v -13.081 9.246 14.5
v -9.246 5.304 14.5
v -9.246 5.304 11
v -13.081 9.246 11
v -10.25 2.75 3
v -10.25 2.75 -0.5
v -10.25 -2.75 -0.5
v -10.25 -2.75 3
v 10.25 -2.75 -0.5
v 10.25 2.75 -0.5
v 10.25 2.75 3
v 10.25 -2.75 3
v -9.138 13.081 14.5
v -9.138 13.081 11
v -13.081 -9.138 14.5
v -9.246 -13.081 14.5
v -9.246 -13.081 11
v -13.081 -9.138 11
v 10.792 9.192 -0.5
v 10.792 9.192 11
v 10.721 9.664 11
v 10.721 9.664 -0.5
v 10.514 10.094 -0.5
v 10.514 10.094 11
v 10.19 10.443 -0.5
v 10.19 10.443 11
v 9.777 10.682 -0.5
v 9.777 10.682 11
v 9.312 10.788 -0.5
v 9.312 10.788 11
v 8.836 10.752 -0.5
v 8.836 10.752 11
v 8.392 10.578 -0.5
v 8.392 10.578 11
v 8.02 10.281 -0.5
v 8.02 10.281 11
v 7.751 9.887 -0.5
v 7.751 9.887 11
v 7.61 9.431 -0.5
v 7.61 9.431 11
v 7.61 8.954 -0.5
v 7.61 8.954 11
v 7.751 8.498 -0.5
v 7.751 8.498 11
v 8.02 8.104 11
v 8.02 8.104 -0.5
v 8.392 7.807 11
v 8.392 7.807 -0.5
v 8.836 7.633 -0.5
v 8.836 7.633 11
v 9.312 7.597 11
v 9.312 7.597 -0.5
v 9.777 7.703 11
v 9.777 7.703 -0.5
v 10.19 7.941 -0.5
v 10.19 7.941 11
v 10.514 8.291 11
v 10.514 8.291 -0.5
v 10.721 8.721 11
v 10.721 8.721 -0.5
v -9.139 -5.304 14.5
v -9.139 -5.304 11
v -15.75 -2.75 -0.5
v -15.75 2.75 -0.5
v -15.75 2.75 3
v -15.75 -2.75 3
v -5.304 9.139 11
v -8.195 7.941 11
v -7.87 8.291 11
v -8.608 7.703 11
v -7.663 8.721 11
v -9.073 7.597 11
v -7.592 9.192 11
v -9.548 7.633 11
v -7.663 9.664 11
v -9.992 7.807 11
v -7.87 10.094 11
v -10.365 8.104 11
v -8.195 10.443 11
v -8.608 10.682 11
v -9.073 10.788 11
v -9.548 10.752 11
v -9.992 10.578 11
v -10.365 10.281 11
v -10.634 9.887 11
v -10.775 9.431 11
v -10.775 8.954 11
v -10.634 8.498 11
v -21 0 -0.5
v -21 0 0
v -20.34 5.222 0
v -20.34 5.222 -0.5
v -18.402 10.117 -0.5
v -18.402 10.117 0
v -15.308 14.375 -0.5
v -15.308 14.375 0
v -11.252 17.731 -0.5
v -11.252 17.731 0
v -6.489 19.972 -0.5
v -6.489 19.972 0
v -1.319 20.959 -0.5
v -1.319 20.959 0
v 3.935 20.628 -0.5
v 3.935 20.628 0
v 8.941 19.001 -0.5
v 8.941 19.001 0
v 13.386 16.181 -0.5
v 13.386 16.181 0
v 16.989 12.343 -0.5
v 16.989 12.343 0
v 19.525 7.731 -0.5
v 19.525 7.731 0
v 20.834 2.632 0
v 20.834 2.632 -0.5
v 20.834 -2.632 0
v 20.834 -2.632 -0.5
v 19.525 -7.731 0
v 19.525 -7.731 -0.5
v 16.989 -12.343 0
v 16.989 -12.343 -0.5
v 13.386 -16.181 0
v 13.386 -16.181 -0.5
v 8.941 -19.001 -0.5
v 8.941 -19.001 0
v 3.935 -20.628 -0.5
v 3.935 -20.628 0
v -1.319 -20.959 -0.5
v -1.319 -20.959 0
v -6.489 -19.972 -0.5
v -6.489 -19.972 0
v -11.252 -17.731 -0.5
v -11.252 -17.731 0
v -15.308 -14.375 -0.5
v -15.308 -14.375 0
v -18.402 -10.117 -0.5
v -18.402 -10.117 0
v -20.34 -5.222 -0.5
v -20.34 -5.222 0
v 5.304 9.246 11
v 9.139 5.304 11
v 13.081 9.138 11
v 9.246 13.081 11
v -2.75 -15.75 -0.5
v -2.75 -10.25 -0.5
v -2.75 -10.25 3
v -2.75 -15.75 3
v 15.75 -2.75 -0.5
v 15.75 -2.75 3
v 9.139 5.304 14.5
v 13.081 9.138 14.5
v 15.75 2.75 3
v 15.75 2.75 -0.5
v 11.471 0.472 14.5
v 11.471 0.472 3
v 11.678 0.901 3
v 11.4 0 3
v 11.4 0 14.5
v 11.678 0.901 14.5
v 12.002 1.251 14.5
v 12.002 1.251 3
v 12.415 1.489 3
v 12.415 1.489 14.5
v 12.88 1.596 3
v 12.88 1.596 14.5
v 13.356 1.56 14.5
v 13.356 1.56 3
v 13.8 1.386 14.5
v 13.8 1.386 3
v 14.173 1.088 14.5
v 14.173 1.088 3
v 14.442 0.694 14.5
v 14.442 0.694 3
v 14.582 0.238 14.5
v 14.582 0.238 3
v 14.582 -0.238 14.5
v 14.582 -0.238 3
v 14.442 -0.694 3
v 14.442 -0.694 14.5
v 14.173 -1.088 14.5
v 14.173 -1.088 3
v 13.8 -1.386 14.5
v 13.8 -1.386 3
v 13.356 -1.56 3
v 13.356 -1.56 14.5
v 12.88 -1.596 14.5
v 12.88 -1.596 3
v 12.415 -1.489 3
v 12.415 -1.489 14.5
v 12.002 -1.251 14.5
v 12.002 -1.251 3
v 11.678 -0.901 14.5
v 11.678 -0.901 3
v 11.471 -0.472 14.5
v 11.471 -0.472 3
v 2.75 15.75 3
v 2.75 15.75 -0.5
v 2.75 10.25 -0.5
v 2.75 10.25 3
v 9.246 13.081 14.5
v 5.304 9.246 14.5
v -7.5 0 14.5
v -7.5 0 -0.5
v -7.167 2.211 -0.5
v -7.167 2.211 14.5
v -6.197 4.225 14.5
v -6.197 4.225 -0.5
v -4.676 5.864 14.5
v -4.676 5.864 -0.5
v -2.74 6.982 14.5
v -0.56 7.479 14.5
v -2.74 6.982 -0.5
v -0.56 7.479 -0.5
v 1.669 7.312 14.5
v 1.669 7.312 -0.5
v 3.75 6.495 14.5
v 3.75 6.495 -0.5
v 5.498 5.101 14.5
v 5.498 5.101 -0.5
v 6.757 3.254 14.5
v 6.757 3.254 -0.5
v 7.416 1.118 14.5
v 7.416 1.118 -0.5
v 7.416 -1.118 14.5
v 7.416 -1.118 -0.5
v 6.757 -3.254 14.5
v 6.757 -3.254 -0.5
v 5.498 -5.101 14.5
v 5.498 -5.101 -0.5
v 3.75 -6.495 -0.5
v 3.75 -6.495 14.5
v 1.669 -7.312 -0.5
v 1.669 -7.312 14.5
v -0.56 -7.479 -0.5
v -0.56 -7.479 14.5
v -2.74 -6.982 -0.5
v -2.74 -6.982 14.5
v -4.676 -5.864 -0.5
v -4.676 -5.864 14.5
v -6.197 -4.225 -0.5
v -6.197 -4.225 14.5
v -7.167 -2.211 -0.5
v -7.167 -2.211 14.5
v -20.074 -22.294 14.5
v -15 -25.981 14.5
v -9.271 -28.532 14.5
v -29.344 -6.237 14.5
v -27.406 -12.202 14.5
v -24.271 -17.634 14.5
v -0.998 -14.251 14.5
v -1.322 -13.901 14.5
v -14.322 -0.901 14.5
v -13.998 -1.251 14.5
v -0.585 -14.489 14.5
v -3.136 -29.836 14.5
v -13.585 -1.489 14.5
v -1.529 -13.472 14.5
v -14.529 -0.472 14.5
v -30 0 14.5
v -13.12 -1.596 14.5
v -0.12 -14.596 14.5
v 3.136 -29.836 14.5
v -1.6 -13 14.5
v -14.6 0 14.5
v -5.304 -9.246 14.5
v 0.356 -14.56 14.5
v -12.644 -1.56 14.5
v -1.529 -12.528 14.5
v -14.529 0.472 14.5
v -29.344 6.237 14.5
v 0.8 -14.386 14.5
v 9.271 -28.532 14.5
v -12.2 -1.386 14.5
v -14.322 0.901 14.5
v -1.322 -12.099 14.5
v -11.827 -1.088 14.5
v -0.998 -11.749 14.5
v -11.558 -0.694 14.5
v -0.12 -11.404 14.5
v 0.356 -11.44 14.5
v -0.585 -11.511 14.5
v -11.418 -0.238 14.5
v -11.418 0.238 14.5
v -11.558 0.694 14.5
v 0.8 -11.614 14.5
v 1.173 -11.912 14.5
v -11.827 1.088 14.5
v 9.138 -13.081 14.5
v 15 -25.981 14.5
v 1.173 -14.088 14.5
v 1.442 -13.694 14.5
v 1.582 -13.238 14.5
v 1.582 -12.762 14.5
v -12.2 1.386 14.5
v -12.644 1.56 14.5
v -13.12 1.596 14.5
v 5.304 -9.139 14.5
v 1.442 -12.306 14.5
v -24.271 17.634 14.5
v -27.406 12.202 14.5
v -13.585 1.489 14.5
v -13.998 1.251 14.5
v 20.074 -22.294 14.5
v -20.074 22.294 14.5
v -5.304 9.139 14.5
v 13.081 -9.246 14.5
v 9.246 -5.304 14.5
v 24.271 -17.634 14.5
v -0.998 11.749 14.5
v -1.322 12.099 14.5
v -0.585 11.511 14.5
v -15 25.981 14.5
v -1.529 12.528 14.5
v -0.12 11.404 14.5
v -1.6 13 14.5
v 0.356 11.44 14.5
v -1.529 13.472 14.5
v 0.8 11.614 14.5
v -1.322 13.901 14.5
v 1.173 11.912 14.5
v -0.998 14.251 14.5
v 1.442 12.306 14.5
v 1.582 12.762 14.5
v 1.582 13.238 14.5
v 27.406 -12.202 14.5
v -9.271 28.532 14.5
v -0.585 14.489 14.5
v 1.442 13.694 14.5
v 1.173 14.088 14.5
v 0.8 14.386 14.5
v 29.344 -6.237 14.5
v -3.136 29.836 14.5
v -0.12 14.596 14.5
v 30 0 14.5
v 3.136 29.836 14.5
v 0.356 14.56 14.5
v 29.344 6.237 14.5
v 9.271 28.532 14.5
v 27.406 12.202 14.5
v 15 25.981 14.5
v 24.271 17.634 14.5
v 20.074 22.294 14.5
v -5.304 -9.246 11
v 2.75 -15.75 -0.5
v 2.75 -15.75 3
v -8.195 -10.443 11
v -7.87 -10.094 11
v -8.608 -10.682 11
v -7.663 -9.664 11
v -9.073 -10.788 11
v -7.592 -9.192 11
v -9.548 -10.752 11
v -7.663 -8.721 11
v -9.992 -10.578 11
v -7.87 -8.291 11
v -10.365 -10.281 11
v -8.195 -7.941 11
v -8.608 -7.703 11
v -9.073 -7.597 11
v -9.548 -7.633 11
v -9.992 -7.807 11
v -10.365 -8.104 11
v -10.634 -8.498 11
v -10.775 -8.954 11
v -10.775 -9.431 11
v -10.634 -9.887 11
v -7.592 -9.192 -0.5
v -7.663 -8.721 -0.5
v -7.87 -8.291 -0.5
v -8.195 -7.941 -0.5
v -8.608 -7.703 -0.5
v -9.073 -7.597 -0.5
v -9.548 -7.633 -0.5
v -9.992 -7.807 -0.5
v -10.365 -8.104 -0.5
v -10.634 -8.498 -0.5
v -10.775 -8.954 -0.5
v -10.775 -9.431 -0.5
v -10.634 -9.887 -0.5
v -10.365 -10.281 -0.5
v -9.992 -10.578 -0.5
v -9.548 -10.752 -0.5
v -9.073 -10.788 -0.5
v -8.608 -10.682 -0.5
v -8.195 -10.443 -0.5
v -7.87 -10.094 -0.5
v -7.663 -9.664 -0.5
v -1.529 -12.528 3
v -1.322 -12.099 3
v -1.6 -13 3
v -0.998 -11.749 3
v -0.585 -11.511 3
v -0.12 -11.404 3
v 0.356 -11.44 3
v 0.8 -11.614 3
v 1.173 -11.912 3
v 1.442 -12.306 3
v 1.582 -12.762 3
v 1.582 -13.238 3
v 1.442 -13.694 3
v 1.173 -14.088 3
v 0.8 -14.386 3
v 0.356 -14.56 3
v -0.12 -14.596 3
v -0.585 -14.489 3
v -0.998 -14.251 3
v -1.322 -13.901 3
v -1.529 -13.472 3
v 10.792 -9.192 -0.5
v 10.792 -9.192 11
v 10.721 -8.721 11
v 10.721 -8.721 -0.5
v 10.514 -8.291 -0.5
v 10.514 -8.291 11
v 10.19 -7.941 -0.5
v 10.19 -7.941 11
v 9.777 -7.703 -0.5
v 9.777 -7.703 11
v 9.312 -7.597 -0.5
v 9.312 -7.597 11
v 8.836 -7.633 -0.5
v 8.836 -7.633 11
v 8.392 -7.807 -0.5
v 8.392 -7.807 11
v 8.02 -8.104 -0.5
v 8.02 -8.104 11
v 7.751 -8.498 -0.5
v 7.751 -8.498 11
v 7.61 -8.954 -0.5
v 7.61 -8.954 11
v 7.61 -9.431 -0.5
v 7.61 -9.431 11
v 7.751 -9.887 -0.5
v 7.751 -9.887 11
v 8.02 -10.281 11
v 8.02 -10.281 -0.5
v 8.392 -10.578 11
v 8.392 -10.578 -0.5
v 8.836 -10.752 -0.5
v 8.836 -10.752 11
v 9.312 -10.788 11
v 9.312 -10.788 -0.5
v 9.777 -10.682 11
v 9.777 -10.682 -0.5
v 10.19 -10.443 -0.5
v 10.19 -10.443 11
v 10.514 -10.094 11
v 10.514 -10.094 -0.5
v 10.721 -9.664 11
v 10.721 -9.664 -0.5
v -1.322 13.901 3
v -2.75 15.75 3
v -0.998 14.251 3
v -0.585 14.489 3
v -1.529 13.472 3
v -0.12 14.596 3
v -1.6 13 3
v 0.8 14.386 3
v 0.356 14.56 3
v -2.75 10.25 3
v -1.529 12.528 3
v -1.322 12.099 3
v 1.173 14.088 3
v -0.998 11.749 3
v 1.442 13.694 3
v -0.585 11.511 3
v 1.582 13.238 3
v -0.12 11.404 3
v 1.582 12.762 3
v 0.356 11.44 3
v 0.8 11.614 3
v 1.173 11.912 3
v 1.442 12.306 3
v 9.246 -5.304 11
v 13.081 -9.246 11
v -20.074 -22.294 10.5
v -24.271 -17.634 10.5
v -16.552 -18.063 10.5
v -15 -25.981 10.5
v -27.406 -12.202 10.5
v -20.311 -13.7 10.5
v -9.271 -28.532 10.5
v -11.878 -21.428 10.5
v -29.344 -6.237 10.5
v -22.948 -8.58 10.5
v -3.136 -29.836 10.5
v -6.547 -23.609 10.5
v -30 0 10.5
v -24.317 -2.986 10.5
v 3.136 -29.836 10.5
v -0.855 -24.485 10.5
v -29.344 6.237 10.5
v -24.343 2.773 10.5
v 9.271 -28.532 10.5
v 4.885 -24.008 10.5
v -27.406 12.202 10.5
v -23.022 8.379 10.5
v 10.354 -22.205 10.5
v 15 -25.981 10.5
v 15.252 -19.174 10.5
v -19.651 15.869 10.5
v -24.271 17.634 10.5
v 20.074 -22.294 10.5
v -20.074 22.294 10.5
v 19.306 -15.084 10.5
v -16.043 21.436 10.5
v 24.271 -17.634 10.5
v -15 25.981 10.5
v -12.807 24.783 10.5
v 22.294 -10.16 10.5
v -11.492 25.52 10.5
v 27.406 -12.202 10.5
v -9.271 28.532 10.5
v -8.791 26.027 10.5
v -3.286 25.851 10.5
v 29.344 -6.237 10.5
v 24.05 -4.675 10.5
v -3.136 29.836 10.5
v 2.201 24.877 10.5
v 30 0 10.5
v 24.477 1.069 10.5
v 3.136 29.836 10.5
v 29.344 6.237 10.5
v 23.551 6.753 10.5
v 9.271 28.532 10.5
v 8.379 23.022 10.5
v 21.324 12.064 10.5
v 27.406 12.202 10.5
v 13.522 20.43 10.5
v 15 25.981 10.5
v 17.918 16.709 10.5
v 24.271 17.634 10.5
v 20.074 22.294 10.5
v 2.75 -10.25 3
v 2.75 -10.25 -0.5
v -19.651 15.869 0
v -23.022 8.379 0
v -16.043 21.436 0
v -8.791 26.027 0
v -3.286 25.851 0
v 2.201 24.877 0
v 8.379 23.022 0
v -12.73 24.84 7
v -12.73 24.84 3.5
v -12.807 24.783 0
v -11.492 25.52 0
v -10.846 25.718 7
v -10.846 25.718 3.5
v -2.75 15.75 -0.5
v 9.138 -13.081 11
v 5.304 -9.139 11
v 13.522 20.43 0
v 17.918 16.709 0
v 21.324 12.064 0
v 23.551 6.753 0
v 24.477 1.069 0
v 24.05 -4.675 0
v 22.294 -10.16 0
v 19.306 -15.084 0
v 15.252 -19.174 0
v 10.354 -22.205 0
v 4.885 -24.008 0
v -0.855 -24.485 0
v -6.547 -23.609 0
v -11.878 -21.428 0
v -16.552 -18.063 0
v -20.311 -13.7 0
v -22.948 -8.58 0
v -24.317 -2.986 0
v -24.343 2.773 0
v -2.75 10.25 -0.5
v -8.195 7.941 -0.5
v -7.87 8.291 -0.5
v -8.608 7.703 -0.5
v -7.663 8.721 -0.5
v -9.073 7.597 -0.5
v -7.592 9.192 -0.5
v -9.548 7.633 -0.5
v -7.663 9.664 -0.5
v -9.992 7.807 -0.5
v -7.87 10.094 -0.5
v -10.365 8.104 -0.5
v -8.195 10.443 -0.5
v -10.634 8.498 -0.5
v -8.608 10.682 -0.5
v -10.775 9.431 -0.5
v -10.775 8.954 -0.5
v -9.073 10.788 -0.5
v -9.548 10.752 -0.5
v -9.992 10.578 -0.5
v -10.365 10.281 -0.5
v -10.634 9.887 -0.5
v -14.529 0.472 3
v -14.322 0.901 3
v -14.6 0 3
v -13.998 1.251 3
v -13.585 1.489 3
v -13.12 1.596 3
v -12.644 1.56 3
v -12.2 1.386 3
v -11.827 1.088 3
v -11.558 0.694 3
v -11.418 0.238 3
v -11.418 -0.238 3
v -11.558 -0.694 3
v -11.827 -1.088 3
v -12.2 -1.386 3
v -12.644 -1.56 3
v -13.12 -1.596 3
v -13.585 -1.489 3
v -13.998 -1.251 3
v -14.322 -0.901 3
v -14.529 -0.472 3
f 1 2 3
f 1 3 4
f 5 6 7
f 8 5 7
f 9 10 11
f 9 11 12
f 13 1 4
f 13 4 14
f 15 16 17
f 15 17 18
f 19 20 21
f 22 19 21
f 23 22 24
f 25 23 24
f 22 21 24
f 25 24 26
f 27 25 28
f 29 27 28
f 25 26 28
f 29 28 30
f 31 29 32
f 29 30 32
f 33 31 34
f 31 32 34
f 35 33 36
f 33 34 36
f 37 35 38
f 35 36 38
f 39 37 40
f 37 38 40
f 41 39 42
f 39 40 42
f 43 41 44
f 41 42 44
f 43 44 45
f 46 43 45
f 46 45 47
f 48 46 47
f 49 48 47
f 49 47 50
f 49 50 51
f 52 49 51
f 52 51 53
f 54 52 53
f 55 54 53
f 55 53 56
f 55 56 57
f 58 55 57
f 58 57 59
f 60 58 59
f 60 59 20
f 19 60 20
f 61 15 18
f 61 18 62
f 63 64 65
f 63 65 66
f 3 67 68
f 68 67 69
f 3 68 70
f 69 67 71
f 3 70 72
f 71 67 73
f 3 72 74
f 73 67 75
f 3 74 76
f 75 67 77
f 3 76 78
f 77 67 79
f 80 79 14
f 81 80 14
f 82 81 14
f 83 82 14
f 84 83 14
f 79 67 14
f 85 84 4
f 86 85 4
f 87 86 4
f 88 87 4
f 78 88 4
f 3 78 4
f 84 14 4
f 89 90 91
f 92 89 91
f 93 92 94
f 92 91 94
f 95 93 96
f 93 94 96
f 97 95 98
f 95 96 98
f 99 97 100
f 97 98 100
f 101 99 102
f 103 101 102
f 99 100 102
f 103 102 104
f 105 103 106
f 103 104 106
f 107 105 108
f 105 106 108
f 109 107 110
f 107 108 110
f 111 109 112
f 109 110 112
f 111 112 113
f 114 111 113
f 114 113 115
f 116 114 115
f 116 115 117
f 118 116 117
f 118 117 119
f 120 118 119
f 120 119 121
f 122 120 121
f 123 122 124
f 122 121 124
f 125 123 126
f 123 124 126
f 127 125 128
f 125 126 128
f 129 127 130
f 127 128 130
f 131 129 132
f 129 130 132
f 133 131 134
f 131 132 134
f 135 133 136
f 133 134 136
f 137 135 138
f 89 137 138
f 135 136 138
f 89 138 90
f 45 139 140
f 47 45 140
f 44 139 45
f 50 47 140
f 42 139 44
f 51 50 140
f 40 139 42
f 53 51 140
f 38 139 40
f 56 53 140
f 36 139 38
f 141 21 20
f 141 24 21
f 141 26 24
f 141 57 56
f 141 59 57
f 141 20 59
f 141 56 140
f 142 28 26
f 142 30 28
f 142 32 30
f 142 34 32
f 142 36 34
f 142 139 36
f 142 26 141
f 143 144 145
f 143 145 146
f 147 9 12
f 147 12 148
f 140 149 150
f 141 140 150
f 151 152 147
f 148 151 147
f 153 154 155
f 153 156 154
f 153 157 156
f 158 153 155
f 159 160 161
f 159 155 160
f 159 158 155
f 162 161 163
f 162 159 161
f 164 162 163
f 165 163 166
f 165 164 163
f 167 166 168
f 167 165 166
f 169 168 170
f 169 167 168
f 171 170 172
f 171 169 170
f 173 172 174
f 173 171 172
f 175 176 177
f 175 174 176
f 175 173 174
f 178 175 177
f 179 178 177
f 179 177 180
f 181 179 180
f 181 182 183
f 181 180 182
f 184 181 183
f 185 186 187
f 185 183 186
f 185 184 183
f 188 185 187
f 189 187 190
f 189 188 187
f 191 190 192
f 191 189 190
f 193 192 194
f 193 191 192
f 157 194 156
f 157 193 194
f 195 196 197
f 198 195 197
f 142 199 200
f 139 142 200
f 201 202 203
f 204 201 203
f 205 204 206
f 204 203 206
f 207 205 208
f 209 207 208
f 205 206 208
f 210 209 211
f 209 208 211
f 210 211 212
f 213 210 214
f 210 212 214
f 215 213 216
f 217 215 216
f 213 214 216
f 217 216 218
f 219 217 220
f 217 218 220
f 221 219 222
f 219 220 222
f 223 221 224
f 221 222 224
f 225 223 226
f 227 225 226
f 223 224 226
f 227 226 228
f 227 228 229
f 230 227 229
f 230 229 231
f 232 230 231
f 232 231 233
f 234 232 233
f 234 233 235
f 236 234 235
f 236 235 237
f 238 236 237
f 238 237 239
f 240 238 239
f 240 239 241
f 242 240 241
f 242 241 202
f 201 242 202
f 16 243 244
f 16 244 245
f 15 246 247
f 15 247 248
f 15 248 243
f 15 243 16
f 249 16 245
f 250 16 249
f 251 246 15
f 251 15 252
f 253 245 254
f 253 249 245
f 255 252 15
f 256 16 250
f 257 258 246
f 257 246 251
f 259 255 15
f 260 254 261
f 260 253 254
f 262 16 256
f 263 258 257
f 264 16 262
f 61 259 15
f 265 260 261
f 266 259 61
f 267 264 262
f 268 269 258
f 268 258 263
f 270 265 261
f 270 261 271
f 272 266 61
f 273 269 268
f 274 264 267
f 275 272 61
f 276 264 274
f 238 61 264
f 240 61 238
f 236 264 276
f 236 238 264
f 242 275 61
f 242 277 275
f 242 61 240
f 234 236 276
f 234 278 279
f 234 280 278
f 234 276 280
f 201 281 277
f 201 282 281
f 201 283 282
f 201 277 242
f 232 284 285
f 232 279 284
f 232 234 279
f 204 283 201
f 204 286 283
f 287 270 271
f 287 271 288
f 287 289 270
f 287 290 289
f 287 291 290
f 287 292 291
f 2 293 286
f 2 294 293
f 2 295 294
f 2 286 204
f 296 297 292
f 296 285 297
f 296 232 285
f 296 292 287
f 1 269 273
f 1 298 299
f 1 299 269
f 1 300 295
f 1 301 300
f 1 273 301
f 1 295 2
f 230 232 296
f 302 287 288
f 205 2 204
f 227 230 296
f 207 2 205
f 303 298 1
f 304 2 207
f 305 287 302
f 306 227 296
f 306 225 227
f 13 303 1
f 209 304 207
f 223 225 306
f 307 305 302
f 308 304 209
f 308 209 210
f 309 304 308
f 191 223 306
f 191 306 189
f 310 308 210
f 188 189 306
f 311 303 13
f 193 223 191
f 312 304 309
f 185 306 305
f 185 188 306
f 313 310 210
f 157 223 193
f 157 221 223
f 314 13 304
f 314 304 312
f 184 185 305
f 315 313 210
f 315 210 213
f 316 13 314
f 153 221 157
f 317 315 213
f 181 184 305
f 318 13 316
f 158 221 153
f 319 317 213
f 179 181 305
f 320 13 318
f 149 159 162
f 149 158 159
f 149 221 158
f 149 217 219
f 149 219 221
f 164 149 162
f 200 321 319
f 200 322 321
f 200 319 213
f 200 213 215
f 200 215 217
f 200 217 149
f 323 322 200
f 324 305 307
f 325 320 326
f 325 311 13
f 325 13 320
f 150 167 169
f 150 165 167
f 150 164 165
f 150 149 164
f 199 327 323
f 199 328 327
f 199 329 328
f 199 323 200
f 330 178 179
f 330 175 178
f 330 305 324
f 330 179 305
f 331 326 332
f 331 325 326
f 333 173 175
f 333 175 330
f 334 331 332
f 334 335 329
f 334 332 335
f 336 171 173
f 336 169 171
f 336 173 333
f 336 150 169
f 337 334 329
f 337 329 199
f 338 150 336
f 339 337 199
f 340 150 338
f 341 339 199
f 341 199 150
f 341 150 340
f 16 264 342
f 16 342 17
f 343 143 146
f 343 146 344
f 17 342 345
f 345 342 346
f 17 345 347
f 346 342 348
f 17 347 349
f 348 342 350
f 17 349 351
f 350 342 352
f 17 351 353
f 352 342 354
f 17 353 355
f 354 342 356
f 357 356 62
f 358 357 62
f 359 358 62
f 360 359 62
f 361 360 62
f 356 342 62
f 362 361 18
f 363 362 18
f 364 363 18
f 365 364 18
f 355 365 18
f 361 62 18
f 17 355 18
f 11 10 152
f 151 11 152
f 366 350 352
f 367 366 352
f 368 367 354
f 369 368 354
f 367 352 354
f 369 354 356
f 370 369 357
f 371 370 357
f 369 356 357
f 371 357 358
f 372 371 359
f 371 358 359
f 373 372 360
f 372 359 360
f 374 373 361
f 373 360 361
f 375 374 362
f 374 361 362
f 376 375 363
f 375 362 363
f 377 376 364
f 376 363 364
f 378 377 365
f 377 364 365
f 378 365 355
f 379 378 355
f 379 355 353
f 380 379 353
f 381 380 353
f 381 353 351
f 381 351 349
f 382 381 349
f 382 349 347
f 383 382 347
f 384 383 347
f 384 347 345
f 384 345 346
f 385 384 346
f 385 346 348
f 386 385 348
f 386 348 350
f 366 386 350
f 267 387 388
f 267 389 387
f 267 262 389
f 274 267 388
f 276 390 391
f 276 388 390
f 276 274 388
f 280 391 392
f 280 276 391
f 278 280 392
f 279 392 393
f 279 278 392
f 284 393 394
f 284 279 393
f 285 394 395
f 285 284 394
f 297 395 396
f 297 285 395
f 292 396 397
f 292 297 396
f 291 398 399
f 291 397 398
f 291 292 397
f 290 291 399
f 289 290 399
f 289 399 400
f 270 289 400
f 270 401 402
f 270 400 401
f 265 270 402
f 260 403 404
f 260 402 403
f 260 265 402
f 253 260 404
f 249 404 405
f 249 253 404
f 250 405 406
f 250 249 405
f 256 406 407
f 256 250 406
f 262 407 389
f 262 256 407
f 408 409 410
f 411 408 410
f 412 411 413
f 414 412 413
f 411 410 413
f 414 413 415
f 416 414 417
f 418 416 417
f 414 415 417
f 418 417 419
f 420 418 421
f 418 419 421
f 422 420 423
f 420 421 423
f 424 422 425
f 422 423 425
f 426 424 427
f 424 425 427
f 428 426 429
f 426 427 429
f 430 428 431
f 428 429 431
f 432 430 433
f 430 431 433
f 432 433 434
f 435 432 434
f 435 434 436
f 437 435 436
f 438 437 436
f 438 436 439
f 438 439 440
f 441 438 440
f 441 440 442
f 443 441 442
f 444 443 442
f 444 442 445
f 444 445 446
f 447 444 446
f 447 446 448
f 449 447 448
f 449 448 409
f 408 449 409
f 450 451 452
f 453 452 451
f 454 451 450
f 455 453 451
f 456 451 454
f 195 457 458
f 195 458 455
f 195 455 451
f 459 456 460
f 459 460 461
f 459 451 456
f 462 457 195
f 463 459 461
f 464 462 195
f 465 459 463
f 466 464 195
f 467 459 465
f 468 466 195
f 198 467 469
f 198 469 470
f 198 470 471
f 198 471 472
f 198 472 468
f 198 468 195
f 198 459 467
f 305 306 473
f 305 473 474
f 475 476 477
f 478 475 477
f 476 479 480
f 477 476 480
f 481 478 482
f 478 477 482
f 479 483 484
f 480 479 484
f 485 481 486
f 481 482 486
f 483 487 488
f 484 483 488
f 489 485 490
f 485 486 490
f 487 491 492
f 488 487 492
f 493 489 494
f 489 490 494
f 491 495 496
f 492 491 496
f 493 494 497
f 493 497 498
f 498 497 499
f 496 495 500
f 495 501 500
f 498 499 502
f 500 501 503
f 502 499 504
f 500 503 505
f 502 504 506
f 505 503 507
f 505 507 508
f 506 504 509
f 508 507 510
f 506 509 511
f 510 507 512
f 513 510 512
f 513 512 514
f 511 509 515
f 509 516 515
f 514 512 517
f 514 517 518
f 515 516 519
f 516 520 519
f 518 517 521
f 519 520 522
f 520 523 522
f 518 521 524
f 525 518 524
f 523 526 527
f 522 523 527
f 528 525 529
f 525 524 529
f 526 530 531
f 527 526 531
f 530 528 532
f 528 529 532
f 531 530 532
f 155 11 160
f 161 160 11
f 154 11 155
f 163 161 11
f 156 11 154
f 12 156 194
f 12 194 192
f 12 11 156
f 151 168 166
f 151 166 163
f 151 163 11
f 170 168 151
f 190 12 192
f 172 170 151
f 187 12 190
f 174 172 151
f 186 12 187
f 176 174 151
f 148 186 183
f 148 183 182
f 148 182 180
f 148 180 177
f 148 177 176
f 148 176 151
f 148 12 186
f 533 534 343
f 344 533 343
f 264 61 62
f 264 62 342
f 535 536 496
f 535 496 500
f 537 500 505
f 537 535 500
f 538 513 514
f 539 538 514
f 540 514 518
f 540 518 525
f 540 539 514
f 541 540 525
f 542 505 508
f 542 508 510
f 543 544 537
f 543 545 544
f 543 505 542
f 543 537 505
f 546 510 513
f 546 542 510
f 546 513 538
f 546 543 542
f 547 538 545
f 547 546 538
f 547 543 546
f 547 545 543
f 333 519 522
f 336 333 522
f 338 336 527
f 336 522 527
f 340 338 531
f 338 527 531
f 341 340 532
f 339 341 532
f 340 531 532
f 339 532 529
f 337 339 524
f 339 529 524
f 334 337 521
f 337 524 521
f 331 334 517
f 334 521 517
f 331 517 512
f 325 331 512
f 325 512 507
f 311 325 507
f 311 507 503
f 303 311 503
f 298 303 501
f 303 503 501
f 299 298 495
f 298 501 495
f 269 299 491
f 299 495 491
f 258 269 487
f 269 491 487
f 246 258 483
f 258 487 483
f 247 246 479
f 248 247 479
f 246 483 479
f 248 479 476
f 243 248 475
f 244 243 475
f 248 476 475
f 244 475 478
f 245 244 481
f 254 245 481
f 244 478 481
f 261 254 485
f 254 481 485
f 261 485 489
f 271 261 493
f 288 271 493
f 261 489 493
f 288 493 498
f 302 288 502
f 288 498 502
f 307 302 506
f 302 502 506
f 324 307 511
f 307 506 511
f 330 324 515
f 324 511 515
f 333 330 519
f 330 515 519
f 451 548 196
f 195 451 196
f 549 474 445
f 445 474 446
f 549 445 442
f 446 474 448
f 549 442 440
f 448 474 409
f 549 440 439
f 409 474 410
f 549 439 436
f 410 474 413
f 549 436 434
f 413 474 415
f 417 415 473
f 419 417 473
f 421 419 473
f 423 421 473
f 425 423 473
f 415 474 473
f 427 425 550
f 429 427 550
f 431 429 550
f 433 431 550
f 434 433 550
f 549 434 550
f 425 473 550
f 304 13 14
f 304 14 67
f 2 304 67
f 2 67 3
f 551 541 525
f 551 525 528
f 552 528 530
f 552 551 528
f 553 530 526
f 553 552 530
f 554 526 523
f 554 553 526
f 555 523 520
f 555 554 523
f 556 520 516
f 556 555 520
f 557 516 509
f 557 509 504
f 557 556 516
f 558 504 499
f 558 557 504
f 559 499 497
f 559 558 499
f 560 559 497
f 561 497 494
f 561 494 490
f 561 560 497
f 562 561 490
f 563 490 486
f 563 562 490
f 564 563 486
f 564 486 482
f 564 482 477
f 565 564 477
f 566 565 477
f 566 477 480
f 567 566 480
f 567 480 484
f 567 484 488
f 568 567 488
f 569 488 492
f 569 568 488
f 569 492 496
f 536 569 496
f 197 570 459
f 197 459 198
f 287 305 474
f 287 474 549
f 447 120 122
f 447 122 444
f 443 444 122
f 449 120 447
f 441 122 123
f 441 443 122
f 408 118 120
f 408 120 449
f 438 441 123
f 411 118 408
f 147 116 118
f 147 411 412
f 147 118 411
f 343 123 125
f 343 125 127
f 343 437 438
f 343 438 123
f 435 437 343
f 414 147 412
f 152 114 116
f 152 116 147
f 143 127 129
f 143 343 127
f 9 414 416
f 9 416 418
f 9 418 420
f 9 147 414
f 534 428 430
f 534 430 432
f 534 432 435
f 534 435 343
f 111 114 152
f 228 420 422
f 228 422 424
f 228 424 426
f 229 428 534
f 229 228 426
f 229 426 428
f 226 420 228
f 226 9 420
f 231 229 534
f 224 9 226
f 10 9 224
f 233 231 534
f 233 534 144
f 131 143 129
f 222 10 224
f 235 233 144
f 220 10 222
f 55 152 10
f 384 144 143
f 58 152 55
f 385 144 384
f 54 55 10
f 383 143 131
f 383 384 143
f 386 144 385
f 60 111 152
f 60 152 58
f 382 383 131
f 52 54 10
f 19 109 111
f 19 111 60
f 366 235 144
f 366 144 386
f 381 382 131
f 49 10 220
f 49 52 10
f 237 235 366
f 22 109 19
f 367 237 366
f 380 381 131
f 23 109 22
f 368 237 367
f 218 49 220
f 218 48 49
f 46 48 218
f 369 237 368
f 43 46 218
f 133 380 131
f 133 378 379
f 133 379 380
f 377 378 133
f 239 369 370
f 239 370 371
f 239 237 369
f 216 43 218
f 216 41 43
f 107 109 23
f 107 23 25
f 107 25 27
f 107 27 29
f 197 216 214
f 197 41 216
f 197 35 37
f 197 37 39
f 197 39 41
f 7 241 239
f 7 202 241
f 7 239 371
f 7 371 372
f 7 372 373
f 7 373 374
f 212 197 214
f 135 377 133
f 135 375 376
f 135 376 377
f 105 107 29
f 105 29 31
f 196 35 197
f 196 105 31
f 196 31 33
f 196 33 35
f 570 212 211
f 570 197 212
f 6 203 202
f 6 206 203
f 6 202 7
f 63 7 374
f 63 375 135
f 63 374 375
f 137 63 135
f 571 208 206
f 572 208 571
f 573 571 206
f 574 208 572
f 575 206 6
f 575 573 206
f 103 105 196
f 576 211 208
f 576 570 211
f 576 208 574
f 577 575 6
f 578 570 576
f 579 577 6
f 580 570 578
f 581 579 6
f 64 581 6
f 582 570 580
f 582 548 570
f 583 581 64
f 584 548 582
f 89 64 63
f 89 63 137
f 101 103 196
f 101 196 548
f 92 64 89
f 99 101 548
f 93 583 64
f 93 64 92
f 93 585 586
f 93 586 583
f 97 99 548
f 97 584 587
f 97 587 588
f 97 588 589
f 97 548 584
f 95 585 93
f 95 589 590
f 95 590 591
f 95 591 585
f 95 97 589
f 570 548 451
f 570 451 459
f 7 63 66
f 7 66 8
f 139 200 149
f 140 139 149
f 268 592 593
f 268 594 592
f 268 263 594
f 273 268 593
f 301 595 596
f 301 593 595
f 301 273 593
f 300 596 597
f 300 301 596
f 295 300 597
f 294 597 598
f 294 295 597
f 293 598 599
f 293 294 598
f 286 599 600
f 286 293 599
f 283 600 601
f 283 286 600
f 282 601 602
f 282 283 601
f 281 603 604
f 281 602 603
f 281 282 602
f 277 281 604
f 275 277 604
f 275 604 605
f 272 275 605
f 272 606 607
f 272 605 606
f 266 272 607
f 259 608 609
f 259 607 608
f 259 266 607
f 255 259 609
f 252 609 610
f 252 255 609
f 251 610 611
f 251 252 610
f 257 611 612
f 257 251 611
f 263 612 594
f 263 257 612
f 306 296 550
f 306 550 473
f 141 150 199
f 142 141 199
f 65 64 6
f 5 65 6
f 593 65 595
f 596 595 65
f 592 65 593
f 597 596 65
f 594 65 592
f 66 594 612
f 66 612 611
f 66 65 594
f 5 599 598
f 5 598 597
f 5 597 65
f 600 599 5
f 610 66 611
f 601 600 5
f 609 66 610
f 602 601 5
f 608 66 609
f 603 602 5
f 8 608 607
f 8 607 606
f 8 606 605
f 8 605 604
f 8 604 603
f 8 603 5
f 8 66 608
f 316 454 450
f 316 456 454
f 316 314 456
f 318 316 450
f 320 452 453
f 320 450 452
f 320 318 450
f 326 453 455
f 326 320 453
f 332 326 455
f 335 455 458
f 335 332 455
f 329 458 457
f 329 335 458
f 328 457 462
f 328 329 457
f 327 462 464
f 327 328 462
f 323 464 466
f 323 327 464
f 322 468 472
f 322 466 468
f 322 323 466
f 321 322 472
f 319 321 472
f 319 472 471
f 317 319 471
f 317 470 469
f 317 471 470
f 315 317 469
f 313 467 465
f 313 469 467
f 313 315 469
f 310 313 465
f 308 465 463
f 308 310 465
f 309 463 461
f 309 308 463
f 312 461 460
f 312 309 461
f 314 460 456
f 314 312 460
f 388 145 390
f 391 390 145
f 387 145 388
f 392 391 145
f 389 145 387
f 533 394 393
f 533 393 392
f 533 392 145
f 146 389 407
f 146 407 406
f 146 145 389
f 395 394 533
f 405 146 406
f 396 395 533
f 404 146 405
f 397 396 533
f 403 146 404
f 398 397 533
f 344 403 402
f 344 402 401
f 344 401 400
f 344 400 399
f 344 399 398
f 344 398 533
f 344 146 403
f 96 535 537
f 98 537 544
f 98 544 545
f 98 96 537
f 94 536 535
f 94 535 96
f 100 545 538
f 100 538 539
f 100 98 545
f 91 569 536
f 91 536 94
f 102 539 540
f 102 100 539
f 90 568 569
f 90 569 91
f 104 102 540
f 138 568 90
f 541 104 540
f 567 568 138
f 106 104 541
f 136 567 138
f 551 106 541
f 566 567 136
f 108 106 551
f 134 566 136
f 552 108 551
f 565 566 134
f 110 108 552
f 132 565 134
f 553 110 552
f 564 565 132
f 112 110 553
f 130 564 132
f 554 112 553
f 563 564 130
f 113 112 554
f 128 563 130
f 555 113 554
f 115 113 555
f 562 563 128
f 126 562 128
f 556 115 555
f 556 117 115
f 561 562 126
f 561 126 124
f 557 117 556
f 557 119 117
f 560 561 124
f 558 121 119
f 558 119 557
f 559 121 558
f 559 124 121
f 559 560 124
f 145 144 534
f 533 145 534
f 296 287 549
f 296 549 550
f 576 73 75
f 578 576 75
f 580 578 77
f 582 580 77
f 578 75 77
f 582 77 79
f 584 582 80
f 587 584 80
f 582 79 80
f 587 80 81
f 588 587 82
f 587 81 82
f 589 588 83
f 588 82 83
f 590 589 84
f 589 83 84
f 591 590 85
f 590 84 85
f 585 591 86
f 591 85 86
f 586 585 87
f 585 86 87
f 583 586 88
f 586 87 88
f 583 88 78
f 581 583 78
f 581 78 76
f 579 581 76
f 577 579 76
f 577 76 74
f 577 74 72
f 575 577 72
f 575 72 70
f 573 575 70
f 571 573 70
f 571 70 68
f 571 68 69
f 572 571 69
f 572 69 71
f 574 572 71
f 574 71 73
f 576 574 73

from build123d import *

# Parameters (mm, degrees)
SKETCH1_R           = 21
SKETCH1_R_2         = 2.85
SKETCH1_R_3         = 1.6
BOSS_EXTRUDE1_DEPTH = 10.5
SKETCH2_R           = 24.5
SKETCH2_R_2         = 21
BOSS_EXTRUDE3_DEPTH = 10.5
SKETCH4_R           = 30
SKETCH4_R_2         = 1.6
BOSS_EXTRUDE5_DEPTH = 4
SKETCH3_R           = 21
SKETCH3_R_2         = 1.6
BOSS_EXTRUDE4_DEPTH = 0.5
SKETCH6_W           = 5.5
SKETCH6_H           = 5.5
CUT_EXTRUDE2_DEPTH  = 3.5
SKETCH7_R           = 1.6
CUT_EXTRUDE3_DEPTH  = 46.000000133
SKETCH7_3_R         = 1.6
CUT_EXTRUDE4_DEPTH  = 3.5
SKETCH8_R           = 7.5
CUT_EXTRUDE5_DEPTH  = 46.000000133


with BuildPart() as part:
    # Sketch1 → Boss-Extrude1 (new body)
    with BuildSketch(Plane(origin=(0, 0, 0), x_dir=(0, 1, 0), z_dir=(0, 0, 1))):
        with Locations(Location((0, 0, 0), (0, 0, 90))):
            Circle(SKETCH1_R)
        with Locations((-13, 0)):
            Circle(SKETCH1_R_2, mode=Mode.SUBTRACT)
        with Locations((0, -13)):
            Circle(SKETCH1_R_2, mode=Mode.SUBTRACT)
        with Locations((13, 0)):
            Circle(SKETCH1_R_2, mode=Mode.SUBTRACT)
        with Locations((0, 13)):
            Circle(SKETCH1_R_2, mode=Mode.SUBTRACT)
        with Locations((-13, 0)):
            Circle(SKETCH1_R_2)
        with Locations(Location((-13, 0, 0), (0, 0, 90))):
            Circle(SKETCH1_R_3, mode=Mode.SUBTRACT)
        with Locations((0, 13)):
            Circle(SKETCH1_R_2)
        with Locations(Location((0, 13, 0), (0, 0, 90))):
            Circle(SKETCH1_R_3, mode=Mode.SUBTRACT)
        with Locations((13, 0)):
            Circle(SKETCH1_R_2)
        with Locations(Location((13, 0, 0), (0, 0, 90))):
            Circle(SKETCH1_R_3, mode=Mode.SUBTRACT)
        with Locations((0, -13)):
            Circle(SKETCH1_R_2)
        with Locations(Location((0, -13, 0), (0, 0, 90))):
            Circle(SKETCH1_R_3, mode=Mode.SUBTRACT)
    extrude(amount=BOSS_EXTRUDE1_DEPTH)

    # Sketch2 → Boss-Extrude3 (add)
    with BuildSketch(Plane(origin=(0, 0, 0), x_dir=(1, 0, 0), z_dir=(0, 0, -1))):
        Circle(SKETCH2_R)
        Circle(SKETCH2_R_2, mode=Mode.SUBTRACT)
        with BuildLine():
            ThreePointArc((8.379493511, -23.022469209), (-10.354147413, -22.204540782), (-23.022469209, -8.379493511))
            add(Edge.make_bspline(
                [(-23.022469209, -8.379493511), (-19.944287919, -16.836727099), (-14.510611155, -24.167819962), (-9.186383124, -26.650548266), (-0.077740076, -26.100650499), (8.379493511, -23.022469209)],
                knots=[0, 0, 0, 0, 0.45, 0.55, 1, 1, 1, 1], degree=3))
        make_face()
    extrude(amount=-BOSS_EXTRUDE3_DEPTH)

    # Sketch4 → Boss-Extrude5 (add)
    with BuildSketch(Plane.XY.offset(10.5)):
        Circle(SKETCH4_R)
        with Locations(Location((-13, 0, 0), (0, 0, 180))):
            Circle(SKETCH4_R_2, mode=Mode.SUBTRACT)
        with Locations(Location((0, 13, 0), (0, 0, 180))):
            Circle(SKETCH4_R_2, mode=Mode.SUBTRACT)
        with Locations(Location((13, 0, 0), (0, 0, 180))):
            Circle(SKETCH4_R_2, mode=Mode.SUBTRACT)
        with Locations(Location((0, -13, 0), (0, 0, 180))):
            Circle(SKETCH4_R_2, mode=Mode.SUBTRACT)
    extrude(amount=BOSS_EXTRUDE5_DEPTH)

    # Sketch3 → Boss-Extrude4 (add)
    with BuildSketch(Plane(origin=(0, 0, 0), x_dir=(1, 0, 0), z_dir=(0, 0, -1))):
        with Locations(Location((0, 0, 0), (0, 0, 180))):
            Circle(SKETCH3_R)
        with Locations(Location((-13, 0, 0), (0, 0, 180))):
            Circle(SKETCH3_R_2, mode=Mode.SUBTRACT)
        with Locations(Location((0, 13, 0), (0, 0, 180))):
            Circle(SKETCH3_R_2, mode=Mode.SUBTRACT)
        with Locations(Location((13, 0, 0), (0, 0, 180))):
            Circle(SKETCH3_R_2, mode=Mode.SUBTRACT)
        with Locations(Location((0, -13, 0), (0, 0, 180))):
            Circle(SKETCH3_R_2, mode=Mode.SUBTRACT)
    extrude(amount=BOSS_EXTRUDE4_DEPTH)

    # Sketch6 → Cut-Extrude2 (cut)
    with BuildSketch(Plane(origin=(0, 0, -0.5), x_dir=(1, 0, 0), z_dir=(0, 0, -1))):
        with Locations((13, 0)):
            Rectangle(SKETCH6_W, SKETCH6_H)
        with Locations((0, 13)):
            Rectangle(SKETCH6_W, SKETCH6_H)
        with Locations((0, -13)):
            Rectangle(SKETCH6_W, SKETCH6_H)
        with Locations((-13, 0)):
            Rectangle(SKETCH6_W, SKETCH6_H)
    extrude(amount=-CUT_EXTRUDE2_DEPTH, mode=Mode.SUBTRACT)

    # Sketch7 → Cut-Extrude3 (cut, through all)
    with BuildSketch(Plane.XY.offset(14.5)):
        with Locations((9.192388155, 9.192388155)):
            Circle(SKETCH7_R)
        with Locations((9.192388155, -9.192388155)):
            Circle(SKETCH7_R)
        with Locations((-9.192388155, -9.192388155)):
            Circle(SKETCH7_R)
        with Locations((-9.192388155, 9.192388155)):
            Circle(SKETCH7_R)
    extrude(amount=-CUT_EXTRUDE3_DEPTH, mode=Mode.SUBTRACT)

    # Sketch7<3> → Cut-Extrude4 (cut)
    with BuildSketch(Plane.XY.offset(14.5)):
        Polygon((9.245595054, 13.080678059), (5.304110209, 9.246461763), (9.139181257, 5.304098252), (13.080666102, 9.138314547), align=None)
        with Locations((9.192388155, 9.192388155)):
            Circle(SKETCH7_3_R, mode=Mode.SUBTRACT)
        Polygon((9.138314547, -13.080666102), (5.304098252, -9.139181257), (9.246461763, -5.304110209), (13.080678059, -9.245595054), align=None)
        with Locations((9.192388155, -9.192388155)):
            Circle(SKETCH7_3_R, mode=Mode.SUBTRACT)
        Polygon((-13.080666102, -9.138314547), (-9.139181257, -5.304098252), (-5.304110209, -9.246461763), (-9.245595054, -13.080678059), align=None)
        with Locations((-9.192388155, -9.192388155)):
            Circle(SKETCH7_3_R, mode=Mode.SUBTRACT)
        Polygon((-9.138314547, 13.080666102), (-5.304098252, 9.139181257), (-9.246461763, 5.304110209), (-13.080678059, 9.245595054), align=None)
        with Locations((-9.192388155, 9.192388155)):
            Circle(SKETCH7_3_R, mode=Mode.SUBTRACT)
    extrude(amount=-CUT_EXTRUDE4_DEPTH, mode=Mode.SUBTRACT)

    # Sketch8 → Cut-Extrude5 (cut, through all)
    with BuildSketch(Plane(origin=(0, 0, -0.5), x_dir=(1, 0, 0), z_dir=(0, 0, -1))):
        with Locations(Location((0, 0, 0), (0, 0, 180))):
            Circle(SKETCH8_R)
    extrude(amount=-CUT_EXTRUDE5_DEPTH, mode=Mode.SUBTRACT)


solid = part.part
